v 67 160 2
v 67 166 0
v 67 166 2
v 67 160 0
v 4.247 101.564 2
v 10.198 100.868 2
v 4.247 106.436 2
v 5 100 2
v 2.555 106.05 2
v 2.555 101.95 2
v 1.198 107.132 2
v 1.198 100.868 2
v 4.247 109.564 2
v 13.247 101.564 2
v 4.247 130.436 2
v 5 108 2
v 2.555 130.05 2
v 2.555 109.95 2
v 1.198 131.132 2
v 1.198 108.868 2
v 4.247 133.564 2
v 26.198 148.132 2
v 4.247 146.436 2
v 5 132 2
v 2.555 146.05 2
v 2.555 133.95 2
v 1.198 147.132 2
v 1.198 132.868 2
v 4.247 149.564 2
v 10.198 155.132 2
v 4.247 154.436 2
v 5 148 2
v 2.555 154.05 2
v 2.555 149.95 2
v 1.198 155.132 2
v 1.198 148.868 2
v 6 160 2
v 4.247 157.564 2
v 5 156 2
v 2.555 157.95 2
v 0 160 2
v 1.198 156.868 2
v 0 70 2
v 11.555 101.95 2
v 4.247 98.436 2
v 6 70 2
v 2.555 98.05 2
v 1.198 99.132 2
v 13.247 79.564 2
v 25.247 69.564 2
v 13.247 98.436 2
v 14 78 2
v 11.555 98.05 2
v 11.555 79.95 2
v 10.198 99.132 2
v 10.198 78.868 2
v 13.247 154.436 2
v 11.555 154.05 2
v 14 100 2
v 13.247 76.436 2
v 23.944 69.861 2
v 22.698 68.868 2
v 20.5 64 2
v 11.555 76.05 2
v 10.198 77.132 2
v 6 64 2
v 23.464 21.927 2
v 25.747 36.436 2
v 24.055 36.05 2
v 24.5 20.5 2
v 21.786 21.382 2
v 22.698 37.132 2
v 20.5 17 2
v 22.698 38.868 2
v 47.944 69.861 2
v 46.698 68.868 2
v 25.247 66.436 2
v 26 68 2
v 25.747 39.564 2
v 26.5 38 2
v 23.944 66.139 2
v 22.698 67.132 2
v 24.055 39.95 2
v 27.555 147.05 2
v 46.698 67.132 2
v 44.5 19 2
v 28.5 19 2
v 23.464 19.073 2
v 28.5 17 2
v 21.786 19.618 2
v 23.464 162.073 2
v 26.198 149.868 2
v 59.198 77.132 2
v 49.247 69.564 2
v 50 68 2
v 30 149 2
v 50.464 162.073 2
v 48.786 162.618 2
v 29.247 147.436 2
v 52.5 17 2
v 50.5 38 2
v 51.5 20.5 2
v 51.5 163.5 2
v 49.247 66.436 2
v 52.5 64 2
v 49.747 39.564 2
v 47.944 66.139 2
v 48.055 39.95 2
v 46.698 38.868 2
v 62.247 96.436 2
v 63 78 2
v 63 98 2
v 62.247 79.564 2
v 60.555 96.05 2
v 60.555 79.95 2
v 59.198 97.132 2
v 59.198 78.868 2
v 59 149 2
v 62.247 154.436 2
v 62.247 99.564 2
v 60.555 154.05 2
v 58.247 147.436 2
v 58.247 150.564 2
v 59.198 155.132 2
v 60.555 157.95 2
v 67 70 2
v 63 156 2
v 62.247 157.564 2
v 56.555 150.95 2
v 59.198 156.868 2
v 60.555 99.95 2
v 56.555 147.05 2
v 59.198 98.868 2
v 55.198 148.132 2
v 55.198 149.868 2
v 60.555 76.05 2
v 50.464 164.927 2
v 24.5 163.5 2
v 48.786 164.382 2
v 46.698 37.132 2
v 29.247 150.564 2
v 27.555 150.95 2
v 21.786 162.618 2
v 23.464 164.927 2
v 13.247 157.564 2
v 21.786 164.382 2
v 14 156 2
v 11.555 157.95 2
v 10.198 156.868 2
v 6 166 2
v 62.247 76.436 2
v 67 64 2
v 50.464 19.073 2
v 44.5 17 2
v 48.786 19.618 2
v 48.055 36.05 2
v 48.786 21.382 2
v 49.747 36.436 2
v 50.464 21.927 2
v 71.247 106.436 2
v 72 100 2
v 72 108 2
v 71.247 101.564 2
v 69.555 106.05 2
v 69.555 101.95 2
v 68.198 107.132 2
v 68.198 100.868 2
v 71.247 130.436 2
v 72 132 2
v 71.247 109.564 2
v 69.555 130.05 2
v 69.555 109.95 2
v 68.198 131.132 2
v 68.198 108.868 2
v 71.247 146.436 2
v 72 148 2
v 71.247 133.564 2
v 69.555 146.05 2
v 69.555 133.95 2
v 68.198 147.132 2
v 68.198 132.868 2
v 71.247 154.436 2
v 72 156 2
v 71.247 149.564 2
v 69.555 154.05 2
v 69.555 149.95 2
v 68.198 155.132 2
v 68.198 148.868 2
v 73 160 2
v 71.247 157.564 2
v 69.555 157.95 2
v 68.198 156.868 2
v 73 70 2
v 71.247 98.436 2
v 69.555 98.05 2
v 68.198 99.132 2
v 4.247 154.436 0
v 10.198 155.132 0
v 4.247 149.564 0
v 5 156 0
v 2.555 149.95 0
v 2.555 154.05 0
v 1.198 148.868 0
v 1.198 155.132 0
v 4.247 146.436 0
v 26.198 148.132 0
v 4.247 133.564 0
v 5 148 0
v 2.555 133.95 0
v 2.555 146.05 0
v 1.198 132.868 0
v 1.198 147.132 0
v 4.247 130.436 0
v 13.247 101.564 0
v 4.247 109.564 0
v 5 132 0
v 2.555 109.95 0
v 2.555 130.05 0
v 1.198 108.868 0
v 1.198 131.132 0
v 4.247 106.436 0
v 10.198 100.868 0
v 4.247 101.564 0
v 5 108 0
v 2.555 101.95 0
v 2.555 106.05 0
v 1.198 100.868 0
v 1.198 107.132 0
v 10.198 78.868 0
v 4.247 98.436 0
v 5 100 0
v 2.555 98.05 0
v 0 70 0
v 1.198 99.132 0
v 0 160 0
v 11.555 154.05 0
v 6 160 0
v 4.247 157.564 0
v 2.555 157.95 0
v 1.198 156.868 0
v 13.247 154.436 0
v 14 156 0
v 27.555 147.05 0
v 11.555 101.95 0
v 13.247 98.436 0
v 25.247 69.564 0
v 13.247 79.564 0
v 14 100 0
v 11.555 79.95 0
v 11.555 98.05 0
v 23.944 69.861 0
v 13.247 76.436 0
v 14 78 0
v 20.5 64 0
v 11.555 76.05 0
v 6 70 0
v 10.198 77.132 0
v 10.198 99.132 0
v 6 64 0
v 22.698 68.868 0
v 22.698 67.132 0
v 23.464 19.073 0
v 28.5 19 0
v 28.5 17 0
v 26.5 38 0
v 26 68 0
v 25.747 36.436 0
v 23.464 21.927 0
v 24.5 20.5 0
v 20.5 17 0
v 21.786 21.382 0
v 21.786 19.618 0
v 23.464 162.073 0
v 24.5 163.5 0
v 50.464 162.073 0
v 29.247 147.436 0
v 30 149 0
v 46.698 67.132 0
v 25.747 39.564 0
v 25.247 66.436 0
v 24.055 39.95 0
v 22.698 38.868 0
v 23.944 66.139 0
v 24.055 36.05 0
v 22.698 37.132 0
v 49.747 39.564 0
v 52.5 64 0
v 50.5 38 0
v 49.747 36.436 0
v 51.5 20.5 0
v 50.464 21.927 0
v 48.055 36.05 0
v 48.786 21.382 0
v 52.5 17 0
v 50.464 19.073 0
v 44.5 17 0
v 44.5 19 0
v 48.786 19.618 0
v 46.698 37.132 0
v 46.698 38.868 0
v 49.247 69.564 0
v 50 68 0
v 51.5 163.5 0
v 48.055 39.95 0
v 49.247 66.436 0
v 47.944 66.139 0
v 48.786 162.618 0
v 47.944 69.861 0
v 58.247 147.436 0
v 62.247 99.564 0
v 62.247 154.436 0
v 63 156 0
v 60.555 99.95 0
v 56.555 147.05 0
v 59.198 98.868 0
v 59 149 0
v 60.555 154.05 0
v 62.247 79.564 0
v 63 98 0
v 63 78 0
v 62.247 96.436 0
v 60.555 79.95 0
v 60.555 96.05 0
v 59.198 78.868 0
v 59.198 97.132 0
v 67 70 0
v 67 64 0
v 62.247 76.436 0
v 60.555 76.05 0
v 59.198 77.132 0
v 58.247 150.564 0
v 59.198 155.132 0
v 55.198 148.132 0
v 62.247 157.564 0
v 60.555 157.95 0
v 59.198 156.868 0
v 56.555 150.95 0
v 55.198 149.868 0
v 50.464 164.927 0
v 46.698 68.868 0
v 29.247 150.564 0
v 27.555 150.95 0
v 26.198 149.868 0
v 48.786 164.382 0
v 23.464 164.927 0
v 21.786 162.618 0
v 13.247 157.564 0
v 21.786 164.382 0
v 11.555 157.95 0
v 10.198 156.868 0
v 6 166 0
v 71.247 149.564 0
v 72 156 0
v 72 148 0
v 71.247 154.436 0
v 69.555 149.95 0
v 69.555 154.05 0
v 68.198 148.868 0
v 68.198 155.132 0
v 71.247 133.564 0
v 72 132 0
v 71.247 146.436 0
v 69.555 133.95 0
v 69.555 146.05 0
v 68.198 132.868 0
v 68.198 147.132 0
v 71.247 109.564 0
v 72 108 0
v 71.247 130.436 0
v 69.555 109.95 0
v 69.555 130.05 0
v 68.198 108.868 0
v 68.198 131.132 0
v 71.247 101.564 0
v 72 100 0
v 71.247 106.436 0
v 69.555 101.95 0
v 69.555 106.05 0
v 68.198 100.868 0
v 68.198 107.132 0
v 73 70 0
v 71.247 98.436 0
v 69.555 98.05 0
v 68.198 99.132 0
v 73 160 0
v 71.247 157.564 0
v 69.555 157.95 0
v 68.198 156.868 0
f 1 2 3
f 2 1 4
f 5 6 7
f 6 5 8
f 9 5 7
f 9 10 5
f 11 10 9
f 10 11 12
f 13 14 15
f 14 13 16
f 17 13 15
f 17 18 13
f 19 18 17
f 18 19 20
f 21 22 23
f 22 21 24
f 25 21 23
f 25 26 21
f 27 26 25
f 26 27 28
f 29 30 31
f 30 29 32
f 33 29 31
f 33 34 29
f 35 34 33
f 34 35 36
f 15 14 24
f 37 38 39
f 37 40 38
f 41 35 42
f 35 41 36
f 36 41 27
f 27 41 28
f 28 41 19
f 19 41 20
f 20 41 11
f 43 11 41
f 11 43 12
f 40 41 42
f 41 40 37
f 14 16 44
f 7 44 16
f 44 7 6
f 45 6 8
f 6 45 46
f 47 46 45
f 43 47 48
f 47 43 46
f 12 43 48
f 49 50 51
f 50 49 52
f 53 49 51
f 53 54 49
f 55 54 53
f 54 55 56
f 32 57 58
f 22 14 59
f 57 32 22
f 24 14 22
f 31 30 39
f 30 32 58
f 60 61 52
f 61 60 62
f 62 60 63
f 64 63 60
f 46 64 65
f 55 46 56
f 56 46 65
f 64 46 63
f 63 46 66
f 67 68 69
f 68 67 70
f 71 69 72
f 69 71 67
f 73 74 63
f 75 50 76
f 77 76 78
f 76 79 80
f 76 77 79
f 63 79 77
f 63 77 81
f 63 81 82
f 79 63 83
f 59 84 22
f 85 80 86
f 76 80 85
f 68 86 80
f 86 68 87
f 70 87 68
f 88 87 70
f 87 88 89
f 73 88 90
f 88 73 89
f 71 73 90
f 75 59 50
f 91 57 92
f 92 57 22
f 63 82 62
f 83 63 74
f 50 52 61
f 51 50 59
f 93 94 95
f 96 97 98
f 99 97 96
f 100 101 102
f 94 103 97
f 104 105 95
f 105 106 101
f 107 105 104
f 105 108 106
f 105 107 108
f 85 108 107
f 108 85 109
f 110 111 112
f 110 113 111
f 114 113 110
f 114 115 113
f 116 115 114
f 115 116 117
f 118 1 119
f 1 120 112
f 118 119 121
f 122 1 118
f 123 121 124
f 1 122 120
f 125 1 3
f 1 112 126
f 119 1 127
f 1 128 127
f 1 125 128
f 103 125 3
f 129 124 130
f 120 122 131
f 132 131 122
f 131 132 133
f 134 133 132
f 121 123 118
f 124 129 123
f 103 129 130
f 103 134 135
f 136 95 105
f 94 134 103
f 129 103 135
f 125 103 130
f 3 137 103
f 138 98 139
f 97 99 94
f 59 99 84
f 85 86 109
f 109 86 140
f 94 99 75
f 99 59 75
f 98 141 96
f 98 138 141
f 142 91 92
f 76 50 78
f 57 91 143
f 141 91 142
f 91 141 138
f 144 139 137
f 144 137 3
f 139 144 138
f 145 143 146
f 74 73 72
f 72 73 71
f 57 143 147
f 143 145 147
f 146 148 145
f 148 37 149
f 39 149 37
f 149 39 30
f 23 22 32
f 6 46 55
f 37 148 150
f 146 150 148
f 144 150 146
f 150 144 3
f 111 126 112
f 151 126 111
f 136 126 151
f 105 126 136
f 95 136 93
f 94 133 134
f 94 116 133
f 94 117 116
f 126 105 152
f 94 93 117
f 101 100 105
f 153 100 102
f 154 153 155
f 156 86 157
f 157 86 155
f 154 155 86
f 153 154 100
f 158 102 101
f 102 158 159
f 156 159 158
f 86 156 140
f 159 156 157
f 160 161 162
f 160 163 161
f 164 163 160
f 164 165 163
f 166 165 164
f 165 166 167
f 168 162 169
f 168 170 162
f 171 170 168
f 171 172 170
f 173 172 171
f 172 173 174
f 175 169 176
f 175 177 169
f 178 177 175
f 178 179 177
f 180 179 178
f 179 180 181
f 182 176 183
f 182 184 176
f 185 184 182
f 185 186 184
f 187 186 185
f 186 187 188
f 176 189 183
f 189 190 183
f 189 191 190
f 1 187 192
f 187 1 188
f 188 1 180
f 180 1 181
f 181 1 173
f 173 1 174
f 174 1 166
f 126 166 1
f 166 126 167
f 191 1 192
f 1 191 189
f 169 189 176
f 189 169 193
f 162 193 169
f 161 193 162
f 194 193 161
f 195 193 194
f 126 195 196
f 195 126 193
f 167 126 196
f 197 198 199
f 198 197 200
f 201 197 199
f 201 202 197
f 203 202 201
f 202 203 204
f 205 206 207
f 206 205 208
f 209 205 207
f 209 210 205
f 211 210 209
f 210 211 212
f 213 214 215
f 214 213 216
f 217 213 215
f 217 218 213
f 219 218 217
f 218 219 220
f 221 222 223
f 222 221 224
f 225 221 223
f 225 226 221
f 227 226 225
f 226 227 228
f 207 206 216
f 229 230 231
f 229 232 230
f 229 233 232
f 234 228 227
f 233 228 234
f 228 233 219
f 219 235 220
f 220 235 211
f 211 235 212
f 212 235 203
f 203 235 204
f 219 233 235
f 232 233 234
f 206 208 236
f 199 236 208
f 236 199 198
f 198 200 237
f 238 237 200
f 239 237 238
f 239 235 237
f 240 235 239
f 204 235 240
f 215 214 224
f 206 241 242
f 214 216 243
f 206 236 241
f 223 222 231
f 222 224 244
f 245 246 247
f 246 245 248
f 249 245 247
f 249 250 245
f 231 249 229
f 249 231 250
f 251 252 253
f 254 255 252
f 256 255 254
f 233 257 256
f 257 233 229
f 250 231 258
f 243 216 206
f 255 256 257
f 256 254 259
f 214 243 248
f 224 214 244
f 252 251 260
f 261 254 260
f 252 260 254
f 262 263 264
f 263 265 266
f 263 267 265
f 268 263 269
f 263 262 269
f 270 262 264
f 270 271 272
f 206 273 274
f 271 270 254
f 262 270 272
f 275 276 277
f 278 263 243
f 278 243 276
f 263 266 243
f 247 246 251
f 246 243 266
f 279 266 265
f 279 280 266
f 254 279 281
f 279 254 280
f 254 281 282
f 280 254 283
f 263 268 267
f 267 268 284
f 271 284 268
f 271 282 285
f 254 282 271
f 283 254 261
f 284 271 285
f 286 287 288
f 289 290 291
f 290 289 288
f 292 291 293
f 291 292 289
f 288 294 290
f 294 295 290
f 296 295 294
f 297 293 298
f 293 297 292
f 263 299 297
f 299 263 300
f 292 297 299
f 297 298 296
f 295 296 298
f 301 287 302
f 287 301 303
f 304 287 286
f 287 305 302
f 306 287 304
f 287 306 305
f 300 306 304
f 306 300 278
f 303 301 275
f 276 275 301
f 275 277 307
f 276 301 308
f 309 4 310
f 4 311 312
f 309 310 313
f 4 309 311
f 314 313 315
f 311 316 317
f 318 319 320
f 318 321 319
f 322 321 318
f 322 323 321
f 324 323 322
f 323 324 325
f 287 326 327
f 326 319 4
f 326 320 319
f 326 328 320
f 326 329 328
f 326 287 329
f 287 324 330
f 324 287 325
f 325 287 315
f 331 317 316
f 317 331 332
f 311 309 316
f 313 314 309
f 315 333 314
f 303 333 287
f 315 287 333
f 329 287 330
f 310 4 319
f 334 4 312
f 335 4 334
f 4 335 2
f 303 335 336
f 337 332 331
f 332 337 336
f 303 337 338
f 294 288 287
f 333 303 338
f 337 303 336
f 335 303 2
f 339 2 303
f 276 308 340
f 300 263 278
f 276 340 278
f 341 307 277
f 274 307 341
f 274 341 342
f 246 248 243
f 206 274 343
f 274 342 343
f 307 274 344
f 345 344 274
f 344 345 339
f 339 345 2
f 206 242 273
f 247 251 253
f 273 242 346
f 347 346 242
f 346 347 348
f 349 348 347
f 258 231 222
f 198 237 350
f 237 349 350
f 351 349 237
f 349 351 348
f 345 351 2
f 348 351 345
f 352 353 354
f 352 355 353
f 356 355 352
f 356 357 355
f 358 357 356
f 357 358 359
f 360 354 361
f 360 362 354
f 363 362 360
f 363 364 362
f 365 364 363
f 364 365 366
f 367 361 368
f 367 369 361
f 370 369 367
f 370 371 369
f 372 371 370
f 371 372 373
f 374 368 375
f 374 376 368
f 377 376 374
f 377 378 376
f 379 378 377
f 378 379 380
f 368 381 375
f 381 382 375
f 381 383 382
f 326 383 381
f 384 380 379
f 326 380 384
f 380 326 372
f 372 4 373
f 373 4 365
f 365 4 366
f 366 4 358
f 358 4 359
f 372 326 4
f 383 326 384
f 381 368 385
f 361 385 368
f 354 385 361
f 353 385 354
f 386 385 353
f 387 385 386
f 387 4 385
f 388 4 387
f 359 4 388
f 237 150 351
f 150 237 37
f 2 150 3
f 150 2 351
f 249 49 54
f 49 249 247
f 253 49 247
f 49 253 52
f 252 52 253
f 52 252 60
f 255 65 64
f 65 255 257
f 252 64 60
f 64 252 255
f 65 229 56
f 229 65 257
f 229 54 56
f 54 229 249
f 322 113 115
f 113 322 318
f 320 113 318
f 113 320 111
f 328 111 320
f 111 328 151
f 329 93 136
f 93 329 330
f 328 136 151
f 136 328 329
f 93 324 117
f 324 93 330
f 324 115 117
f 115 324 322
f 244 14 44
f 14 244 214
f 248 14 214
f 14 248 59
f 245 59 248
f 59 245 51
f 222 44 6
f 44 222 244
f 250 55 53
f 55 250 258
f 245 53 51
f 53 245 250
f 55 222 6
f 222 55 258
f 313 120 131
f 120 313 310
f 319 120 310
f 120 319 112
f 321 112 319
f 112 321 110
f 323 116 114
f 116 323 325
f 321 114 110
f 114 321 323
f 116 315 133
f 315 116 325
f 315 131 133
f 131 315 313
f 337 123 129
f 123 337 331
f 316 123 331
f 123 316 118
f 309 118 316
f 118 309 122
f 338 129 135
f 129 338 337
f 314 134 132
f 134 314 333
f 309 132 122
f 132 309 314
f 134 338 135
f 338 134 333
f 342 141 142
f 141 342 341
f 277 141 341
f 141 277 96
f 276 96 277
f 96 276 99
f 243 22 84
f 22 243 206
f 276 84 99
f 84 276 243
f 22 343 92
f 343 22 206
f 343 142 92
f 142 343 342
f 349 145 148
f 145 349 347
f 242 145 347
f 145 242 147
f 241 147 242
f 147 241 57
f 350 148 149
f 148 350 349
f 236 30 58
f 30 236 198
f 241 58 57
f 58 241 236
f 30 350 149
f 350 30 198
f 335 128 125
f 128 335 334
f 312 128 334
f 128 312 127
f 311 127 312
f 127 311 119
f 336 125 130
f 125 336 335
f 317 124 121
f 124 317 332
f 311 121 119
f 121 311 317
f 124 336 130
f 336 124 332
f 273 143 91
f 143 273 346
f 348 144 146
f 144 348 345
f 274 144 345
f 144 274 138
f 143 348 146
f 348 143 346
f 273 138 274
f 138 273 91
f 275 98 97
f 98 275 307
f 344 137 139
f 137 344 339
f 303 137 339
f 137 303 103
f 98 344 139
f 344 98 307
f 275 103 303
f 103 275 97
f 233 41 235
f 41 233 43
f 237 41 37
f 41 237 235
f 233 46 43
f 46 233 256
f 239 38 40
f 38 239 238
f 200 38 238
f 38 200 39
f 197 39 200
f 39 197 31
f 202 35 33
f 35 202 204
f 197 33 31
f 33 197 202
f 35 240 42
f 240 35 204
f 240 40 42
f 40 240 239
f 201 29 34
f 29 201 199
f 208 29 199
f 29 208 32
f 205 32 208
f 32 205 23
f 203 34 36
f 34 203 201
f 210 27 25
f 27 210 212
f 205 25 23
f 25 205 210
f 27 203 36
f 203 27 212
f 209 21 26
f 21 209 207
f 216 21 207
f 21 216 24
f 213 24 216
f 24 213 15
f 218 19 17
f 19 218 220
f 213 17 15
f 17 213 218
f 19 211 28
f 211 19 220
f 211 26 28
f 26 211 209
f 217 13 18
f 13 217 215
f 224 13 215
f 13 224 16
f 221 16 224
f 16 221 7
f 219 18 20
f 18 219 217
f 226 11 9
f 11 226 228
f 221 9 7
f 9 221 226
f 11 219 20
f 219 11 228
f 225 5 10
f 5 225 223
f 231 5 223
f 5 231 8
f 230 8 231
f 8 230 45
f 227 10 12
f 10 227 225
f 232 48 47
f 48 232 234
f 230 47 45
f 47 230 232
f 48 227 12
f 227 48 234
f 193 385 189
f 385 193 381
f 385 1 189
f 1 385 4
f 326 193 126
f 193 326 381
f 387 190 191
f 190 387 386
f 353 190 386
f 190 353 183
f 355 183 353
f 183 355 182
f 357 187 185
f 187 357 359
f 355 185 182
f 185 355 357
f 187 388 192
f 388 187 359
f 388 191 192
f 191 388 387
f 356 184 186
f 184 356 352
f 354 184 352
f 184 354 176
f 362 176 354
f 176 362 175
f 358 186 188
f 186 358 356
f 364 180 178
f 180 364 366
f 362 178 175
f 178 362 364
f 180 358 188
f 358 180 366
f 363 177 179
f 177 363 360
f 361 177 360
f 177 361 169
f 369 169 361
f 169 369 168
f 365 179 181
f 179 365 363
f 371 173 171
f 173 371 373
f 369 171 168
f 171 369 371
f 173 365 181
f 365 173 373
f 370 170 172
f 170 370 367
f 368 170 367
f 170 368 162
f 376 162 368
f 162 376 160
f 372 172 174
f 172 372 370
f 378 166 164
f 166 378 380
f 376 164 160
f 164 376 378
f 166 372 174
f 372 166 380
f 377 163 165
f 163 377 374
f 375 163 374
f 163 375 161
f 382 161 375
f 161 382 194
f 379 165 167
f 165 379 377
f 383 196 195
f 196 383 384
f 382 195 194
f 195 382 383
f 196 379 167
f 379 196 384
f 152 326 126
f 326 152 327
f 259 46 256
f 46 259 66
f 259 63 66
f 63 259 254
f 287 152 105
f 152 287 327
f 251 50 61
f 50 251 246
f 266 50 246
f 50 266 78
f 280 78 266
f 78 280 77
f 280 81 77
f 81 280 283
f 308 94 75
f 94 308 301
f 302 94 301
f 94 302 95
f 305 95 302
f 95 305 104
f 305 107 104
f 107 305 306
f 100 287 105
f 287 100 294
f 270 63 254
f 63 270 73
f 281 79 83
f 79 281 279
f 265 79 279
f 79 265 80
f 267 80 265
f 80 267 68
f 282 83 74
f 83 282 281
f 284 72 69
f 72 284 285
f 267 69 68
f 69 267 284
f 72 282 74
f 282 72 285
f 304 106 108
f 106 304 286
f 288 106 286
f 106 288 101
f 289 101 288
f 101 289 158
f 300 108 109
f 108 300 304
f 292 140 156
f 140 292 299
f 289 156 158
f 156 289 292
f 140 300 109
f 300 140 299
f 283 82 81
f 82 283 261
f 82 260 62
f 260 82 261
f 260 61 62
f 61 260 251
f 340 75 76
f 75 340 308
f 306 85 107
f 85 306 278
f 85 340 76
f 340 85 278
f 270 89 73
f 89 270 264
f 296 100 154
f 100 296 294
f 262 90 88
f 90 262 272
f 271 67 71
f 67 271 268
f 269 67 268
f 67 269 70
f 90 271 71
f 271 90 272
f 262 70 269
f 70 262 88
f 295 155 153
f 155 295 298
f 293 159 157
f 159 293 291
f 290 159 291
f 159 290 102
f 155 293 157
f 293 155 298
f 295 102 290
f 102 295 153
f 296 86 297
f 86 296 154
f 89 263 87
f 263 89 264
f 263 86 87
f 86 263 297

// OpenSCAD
union(){
    translate([0,70,0]){
        translate([6,4,0]){
            difference(){
                cube([61,92,2]);
                
                //Troux pour l'Arduino
                translate([6,4,0]){
                    cylinder(r=2,h=6);
                }
                translate([55,4,0]){
                    cylinder(r=2,h=6);
                }
                
                translate([6,26,0]){
                    cylinder(r=2,h=6);
                }
                translate([55,24,0]){
                    cylinder(r=2,h=6);
                }
                
                translate([51,75,0]){
                    cylinder(r=2,h=6);
                }
                translate([22,75,0]){
                    cylinder(r=2,h=6);
                }
                translate([6,82,0]){
                        cylinder(r=2,h=6);
                }
                translate([55,82,0]){
                        cylinder(r=2,h=6);
                }
                //Troux pour support de la batterie:
                translate([30.5-13.5,86+3.5,0]){
                    cylinder(r=1.5,h=6); 
                }
                translate([30.5+13.5,86+3.5,0]){
                    cylinder(r=1.5,h=6); 
                }
            }
        }
        
        //Troux pour les 2 grand roux
        translate([0,0,0]){
            difference(){
                cube([8,90,2]);
                translate([3,86,0]){
                        cylinder(r=2,h=6);
                }
                translate([3,78,0]){
                        cylinder(r=2,h=6);
                }
                translate([3,62,0]){
                        cylinder(r=2,h=6);
                }
                translate([3,38,0]){
                        cylinder(r=2,h=6);
                }
                translate([3,30,0]){
                        cylinder(r=2,h=6);
                }
            }
        }
        translate([65,0,0]){
            difference(){
                cube([8,90,2]);
                translate([5,86,0]){
                    cylinder(r=2,h=6);
                }
                translate([5,78,0]){
                    cylinder(r=2,h=6);
                }
                translate([5,62,0]){
                    cylinder(r=2,h=6);
                }
                translate([5,38,0]){
                    cylinder(r=2,h=6);
                }
                translate([5,30,0]){
                    cylinder(r=2,h=6);
                }    
            }
        }
    }
    union(){
        //Troux pour 1er roux
        translate([6,64,0]){
            difference(){
                cube([61,10,2]);
                translate([18,4,0]){
                   cylinder(r=2,h=6); 
                }
                translate([42,4,0]){
                   cylinder(r=2,h=6); 
                }
            }
        }
        translate([20.5,34,0]){
            difference(){
                cube([32,38,2]);
                translate([4,4,0]){
                   cylinder(r=2,h=6); 
                }
                translate([28,4,0]){
                   cylinder(r=2,h=6); 
                }
                translate([4,34,0]){
                   cylinder(r=2,h=6); 
                }
                translate([28,34,0]){
                   cylinder(r=2,h=6); 
                }
            }
        }
        translate([20.5,17,0]){
            difference(){
                cube([32,17,2]);
                translate([2.5,3.5,0]){
                   cylinder(r=1.5,h=6); 
                }
                translate([29.5,3.5,0]){
                   cylinder(r=1.5,h=6); 
                }
                translate([8,0,0]){
                    cube([16,2,2]);
                }   
            }
        }
    }
}
